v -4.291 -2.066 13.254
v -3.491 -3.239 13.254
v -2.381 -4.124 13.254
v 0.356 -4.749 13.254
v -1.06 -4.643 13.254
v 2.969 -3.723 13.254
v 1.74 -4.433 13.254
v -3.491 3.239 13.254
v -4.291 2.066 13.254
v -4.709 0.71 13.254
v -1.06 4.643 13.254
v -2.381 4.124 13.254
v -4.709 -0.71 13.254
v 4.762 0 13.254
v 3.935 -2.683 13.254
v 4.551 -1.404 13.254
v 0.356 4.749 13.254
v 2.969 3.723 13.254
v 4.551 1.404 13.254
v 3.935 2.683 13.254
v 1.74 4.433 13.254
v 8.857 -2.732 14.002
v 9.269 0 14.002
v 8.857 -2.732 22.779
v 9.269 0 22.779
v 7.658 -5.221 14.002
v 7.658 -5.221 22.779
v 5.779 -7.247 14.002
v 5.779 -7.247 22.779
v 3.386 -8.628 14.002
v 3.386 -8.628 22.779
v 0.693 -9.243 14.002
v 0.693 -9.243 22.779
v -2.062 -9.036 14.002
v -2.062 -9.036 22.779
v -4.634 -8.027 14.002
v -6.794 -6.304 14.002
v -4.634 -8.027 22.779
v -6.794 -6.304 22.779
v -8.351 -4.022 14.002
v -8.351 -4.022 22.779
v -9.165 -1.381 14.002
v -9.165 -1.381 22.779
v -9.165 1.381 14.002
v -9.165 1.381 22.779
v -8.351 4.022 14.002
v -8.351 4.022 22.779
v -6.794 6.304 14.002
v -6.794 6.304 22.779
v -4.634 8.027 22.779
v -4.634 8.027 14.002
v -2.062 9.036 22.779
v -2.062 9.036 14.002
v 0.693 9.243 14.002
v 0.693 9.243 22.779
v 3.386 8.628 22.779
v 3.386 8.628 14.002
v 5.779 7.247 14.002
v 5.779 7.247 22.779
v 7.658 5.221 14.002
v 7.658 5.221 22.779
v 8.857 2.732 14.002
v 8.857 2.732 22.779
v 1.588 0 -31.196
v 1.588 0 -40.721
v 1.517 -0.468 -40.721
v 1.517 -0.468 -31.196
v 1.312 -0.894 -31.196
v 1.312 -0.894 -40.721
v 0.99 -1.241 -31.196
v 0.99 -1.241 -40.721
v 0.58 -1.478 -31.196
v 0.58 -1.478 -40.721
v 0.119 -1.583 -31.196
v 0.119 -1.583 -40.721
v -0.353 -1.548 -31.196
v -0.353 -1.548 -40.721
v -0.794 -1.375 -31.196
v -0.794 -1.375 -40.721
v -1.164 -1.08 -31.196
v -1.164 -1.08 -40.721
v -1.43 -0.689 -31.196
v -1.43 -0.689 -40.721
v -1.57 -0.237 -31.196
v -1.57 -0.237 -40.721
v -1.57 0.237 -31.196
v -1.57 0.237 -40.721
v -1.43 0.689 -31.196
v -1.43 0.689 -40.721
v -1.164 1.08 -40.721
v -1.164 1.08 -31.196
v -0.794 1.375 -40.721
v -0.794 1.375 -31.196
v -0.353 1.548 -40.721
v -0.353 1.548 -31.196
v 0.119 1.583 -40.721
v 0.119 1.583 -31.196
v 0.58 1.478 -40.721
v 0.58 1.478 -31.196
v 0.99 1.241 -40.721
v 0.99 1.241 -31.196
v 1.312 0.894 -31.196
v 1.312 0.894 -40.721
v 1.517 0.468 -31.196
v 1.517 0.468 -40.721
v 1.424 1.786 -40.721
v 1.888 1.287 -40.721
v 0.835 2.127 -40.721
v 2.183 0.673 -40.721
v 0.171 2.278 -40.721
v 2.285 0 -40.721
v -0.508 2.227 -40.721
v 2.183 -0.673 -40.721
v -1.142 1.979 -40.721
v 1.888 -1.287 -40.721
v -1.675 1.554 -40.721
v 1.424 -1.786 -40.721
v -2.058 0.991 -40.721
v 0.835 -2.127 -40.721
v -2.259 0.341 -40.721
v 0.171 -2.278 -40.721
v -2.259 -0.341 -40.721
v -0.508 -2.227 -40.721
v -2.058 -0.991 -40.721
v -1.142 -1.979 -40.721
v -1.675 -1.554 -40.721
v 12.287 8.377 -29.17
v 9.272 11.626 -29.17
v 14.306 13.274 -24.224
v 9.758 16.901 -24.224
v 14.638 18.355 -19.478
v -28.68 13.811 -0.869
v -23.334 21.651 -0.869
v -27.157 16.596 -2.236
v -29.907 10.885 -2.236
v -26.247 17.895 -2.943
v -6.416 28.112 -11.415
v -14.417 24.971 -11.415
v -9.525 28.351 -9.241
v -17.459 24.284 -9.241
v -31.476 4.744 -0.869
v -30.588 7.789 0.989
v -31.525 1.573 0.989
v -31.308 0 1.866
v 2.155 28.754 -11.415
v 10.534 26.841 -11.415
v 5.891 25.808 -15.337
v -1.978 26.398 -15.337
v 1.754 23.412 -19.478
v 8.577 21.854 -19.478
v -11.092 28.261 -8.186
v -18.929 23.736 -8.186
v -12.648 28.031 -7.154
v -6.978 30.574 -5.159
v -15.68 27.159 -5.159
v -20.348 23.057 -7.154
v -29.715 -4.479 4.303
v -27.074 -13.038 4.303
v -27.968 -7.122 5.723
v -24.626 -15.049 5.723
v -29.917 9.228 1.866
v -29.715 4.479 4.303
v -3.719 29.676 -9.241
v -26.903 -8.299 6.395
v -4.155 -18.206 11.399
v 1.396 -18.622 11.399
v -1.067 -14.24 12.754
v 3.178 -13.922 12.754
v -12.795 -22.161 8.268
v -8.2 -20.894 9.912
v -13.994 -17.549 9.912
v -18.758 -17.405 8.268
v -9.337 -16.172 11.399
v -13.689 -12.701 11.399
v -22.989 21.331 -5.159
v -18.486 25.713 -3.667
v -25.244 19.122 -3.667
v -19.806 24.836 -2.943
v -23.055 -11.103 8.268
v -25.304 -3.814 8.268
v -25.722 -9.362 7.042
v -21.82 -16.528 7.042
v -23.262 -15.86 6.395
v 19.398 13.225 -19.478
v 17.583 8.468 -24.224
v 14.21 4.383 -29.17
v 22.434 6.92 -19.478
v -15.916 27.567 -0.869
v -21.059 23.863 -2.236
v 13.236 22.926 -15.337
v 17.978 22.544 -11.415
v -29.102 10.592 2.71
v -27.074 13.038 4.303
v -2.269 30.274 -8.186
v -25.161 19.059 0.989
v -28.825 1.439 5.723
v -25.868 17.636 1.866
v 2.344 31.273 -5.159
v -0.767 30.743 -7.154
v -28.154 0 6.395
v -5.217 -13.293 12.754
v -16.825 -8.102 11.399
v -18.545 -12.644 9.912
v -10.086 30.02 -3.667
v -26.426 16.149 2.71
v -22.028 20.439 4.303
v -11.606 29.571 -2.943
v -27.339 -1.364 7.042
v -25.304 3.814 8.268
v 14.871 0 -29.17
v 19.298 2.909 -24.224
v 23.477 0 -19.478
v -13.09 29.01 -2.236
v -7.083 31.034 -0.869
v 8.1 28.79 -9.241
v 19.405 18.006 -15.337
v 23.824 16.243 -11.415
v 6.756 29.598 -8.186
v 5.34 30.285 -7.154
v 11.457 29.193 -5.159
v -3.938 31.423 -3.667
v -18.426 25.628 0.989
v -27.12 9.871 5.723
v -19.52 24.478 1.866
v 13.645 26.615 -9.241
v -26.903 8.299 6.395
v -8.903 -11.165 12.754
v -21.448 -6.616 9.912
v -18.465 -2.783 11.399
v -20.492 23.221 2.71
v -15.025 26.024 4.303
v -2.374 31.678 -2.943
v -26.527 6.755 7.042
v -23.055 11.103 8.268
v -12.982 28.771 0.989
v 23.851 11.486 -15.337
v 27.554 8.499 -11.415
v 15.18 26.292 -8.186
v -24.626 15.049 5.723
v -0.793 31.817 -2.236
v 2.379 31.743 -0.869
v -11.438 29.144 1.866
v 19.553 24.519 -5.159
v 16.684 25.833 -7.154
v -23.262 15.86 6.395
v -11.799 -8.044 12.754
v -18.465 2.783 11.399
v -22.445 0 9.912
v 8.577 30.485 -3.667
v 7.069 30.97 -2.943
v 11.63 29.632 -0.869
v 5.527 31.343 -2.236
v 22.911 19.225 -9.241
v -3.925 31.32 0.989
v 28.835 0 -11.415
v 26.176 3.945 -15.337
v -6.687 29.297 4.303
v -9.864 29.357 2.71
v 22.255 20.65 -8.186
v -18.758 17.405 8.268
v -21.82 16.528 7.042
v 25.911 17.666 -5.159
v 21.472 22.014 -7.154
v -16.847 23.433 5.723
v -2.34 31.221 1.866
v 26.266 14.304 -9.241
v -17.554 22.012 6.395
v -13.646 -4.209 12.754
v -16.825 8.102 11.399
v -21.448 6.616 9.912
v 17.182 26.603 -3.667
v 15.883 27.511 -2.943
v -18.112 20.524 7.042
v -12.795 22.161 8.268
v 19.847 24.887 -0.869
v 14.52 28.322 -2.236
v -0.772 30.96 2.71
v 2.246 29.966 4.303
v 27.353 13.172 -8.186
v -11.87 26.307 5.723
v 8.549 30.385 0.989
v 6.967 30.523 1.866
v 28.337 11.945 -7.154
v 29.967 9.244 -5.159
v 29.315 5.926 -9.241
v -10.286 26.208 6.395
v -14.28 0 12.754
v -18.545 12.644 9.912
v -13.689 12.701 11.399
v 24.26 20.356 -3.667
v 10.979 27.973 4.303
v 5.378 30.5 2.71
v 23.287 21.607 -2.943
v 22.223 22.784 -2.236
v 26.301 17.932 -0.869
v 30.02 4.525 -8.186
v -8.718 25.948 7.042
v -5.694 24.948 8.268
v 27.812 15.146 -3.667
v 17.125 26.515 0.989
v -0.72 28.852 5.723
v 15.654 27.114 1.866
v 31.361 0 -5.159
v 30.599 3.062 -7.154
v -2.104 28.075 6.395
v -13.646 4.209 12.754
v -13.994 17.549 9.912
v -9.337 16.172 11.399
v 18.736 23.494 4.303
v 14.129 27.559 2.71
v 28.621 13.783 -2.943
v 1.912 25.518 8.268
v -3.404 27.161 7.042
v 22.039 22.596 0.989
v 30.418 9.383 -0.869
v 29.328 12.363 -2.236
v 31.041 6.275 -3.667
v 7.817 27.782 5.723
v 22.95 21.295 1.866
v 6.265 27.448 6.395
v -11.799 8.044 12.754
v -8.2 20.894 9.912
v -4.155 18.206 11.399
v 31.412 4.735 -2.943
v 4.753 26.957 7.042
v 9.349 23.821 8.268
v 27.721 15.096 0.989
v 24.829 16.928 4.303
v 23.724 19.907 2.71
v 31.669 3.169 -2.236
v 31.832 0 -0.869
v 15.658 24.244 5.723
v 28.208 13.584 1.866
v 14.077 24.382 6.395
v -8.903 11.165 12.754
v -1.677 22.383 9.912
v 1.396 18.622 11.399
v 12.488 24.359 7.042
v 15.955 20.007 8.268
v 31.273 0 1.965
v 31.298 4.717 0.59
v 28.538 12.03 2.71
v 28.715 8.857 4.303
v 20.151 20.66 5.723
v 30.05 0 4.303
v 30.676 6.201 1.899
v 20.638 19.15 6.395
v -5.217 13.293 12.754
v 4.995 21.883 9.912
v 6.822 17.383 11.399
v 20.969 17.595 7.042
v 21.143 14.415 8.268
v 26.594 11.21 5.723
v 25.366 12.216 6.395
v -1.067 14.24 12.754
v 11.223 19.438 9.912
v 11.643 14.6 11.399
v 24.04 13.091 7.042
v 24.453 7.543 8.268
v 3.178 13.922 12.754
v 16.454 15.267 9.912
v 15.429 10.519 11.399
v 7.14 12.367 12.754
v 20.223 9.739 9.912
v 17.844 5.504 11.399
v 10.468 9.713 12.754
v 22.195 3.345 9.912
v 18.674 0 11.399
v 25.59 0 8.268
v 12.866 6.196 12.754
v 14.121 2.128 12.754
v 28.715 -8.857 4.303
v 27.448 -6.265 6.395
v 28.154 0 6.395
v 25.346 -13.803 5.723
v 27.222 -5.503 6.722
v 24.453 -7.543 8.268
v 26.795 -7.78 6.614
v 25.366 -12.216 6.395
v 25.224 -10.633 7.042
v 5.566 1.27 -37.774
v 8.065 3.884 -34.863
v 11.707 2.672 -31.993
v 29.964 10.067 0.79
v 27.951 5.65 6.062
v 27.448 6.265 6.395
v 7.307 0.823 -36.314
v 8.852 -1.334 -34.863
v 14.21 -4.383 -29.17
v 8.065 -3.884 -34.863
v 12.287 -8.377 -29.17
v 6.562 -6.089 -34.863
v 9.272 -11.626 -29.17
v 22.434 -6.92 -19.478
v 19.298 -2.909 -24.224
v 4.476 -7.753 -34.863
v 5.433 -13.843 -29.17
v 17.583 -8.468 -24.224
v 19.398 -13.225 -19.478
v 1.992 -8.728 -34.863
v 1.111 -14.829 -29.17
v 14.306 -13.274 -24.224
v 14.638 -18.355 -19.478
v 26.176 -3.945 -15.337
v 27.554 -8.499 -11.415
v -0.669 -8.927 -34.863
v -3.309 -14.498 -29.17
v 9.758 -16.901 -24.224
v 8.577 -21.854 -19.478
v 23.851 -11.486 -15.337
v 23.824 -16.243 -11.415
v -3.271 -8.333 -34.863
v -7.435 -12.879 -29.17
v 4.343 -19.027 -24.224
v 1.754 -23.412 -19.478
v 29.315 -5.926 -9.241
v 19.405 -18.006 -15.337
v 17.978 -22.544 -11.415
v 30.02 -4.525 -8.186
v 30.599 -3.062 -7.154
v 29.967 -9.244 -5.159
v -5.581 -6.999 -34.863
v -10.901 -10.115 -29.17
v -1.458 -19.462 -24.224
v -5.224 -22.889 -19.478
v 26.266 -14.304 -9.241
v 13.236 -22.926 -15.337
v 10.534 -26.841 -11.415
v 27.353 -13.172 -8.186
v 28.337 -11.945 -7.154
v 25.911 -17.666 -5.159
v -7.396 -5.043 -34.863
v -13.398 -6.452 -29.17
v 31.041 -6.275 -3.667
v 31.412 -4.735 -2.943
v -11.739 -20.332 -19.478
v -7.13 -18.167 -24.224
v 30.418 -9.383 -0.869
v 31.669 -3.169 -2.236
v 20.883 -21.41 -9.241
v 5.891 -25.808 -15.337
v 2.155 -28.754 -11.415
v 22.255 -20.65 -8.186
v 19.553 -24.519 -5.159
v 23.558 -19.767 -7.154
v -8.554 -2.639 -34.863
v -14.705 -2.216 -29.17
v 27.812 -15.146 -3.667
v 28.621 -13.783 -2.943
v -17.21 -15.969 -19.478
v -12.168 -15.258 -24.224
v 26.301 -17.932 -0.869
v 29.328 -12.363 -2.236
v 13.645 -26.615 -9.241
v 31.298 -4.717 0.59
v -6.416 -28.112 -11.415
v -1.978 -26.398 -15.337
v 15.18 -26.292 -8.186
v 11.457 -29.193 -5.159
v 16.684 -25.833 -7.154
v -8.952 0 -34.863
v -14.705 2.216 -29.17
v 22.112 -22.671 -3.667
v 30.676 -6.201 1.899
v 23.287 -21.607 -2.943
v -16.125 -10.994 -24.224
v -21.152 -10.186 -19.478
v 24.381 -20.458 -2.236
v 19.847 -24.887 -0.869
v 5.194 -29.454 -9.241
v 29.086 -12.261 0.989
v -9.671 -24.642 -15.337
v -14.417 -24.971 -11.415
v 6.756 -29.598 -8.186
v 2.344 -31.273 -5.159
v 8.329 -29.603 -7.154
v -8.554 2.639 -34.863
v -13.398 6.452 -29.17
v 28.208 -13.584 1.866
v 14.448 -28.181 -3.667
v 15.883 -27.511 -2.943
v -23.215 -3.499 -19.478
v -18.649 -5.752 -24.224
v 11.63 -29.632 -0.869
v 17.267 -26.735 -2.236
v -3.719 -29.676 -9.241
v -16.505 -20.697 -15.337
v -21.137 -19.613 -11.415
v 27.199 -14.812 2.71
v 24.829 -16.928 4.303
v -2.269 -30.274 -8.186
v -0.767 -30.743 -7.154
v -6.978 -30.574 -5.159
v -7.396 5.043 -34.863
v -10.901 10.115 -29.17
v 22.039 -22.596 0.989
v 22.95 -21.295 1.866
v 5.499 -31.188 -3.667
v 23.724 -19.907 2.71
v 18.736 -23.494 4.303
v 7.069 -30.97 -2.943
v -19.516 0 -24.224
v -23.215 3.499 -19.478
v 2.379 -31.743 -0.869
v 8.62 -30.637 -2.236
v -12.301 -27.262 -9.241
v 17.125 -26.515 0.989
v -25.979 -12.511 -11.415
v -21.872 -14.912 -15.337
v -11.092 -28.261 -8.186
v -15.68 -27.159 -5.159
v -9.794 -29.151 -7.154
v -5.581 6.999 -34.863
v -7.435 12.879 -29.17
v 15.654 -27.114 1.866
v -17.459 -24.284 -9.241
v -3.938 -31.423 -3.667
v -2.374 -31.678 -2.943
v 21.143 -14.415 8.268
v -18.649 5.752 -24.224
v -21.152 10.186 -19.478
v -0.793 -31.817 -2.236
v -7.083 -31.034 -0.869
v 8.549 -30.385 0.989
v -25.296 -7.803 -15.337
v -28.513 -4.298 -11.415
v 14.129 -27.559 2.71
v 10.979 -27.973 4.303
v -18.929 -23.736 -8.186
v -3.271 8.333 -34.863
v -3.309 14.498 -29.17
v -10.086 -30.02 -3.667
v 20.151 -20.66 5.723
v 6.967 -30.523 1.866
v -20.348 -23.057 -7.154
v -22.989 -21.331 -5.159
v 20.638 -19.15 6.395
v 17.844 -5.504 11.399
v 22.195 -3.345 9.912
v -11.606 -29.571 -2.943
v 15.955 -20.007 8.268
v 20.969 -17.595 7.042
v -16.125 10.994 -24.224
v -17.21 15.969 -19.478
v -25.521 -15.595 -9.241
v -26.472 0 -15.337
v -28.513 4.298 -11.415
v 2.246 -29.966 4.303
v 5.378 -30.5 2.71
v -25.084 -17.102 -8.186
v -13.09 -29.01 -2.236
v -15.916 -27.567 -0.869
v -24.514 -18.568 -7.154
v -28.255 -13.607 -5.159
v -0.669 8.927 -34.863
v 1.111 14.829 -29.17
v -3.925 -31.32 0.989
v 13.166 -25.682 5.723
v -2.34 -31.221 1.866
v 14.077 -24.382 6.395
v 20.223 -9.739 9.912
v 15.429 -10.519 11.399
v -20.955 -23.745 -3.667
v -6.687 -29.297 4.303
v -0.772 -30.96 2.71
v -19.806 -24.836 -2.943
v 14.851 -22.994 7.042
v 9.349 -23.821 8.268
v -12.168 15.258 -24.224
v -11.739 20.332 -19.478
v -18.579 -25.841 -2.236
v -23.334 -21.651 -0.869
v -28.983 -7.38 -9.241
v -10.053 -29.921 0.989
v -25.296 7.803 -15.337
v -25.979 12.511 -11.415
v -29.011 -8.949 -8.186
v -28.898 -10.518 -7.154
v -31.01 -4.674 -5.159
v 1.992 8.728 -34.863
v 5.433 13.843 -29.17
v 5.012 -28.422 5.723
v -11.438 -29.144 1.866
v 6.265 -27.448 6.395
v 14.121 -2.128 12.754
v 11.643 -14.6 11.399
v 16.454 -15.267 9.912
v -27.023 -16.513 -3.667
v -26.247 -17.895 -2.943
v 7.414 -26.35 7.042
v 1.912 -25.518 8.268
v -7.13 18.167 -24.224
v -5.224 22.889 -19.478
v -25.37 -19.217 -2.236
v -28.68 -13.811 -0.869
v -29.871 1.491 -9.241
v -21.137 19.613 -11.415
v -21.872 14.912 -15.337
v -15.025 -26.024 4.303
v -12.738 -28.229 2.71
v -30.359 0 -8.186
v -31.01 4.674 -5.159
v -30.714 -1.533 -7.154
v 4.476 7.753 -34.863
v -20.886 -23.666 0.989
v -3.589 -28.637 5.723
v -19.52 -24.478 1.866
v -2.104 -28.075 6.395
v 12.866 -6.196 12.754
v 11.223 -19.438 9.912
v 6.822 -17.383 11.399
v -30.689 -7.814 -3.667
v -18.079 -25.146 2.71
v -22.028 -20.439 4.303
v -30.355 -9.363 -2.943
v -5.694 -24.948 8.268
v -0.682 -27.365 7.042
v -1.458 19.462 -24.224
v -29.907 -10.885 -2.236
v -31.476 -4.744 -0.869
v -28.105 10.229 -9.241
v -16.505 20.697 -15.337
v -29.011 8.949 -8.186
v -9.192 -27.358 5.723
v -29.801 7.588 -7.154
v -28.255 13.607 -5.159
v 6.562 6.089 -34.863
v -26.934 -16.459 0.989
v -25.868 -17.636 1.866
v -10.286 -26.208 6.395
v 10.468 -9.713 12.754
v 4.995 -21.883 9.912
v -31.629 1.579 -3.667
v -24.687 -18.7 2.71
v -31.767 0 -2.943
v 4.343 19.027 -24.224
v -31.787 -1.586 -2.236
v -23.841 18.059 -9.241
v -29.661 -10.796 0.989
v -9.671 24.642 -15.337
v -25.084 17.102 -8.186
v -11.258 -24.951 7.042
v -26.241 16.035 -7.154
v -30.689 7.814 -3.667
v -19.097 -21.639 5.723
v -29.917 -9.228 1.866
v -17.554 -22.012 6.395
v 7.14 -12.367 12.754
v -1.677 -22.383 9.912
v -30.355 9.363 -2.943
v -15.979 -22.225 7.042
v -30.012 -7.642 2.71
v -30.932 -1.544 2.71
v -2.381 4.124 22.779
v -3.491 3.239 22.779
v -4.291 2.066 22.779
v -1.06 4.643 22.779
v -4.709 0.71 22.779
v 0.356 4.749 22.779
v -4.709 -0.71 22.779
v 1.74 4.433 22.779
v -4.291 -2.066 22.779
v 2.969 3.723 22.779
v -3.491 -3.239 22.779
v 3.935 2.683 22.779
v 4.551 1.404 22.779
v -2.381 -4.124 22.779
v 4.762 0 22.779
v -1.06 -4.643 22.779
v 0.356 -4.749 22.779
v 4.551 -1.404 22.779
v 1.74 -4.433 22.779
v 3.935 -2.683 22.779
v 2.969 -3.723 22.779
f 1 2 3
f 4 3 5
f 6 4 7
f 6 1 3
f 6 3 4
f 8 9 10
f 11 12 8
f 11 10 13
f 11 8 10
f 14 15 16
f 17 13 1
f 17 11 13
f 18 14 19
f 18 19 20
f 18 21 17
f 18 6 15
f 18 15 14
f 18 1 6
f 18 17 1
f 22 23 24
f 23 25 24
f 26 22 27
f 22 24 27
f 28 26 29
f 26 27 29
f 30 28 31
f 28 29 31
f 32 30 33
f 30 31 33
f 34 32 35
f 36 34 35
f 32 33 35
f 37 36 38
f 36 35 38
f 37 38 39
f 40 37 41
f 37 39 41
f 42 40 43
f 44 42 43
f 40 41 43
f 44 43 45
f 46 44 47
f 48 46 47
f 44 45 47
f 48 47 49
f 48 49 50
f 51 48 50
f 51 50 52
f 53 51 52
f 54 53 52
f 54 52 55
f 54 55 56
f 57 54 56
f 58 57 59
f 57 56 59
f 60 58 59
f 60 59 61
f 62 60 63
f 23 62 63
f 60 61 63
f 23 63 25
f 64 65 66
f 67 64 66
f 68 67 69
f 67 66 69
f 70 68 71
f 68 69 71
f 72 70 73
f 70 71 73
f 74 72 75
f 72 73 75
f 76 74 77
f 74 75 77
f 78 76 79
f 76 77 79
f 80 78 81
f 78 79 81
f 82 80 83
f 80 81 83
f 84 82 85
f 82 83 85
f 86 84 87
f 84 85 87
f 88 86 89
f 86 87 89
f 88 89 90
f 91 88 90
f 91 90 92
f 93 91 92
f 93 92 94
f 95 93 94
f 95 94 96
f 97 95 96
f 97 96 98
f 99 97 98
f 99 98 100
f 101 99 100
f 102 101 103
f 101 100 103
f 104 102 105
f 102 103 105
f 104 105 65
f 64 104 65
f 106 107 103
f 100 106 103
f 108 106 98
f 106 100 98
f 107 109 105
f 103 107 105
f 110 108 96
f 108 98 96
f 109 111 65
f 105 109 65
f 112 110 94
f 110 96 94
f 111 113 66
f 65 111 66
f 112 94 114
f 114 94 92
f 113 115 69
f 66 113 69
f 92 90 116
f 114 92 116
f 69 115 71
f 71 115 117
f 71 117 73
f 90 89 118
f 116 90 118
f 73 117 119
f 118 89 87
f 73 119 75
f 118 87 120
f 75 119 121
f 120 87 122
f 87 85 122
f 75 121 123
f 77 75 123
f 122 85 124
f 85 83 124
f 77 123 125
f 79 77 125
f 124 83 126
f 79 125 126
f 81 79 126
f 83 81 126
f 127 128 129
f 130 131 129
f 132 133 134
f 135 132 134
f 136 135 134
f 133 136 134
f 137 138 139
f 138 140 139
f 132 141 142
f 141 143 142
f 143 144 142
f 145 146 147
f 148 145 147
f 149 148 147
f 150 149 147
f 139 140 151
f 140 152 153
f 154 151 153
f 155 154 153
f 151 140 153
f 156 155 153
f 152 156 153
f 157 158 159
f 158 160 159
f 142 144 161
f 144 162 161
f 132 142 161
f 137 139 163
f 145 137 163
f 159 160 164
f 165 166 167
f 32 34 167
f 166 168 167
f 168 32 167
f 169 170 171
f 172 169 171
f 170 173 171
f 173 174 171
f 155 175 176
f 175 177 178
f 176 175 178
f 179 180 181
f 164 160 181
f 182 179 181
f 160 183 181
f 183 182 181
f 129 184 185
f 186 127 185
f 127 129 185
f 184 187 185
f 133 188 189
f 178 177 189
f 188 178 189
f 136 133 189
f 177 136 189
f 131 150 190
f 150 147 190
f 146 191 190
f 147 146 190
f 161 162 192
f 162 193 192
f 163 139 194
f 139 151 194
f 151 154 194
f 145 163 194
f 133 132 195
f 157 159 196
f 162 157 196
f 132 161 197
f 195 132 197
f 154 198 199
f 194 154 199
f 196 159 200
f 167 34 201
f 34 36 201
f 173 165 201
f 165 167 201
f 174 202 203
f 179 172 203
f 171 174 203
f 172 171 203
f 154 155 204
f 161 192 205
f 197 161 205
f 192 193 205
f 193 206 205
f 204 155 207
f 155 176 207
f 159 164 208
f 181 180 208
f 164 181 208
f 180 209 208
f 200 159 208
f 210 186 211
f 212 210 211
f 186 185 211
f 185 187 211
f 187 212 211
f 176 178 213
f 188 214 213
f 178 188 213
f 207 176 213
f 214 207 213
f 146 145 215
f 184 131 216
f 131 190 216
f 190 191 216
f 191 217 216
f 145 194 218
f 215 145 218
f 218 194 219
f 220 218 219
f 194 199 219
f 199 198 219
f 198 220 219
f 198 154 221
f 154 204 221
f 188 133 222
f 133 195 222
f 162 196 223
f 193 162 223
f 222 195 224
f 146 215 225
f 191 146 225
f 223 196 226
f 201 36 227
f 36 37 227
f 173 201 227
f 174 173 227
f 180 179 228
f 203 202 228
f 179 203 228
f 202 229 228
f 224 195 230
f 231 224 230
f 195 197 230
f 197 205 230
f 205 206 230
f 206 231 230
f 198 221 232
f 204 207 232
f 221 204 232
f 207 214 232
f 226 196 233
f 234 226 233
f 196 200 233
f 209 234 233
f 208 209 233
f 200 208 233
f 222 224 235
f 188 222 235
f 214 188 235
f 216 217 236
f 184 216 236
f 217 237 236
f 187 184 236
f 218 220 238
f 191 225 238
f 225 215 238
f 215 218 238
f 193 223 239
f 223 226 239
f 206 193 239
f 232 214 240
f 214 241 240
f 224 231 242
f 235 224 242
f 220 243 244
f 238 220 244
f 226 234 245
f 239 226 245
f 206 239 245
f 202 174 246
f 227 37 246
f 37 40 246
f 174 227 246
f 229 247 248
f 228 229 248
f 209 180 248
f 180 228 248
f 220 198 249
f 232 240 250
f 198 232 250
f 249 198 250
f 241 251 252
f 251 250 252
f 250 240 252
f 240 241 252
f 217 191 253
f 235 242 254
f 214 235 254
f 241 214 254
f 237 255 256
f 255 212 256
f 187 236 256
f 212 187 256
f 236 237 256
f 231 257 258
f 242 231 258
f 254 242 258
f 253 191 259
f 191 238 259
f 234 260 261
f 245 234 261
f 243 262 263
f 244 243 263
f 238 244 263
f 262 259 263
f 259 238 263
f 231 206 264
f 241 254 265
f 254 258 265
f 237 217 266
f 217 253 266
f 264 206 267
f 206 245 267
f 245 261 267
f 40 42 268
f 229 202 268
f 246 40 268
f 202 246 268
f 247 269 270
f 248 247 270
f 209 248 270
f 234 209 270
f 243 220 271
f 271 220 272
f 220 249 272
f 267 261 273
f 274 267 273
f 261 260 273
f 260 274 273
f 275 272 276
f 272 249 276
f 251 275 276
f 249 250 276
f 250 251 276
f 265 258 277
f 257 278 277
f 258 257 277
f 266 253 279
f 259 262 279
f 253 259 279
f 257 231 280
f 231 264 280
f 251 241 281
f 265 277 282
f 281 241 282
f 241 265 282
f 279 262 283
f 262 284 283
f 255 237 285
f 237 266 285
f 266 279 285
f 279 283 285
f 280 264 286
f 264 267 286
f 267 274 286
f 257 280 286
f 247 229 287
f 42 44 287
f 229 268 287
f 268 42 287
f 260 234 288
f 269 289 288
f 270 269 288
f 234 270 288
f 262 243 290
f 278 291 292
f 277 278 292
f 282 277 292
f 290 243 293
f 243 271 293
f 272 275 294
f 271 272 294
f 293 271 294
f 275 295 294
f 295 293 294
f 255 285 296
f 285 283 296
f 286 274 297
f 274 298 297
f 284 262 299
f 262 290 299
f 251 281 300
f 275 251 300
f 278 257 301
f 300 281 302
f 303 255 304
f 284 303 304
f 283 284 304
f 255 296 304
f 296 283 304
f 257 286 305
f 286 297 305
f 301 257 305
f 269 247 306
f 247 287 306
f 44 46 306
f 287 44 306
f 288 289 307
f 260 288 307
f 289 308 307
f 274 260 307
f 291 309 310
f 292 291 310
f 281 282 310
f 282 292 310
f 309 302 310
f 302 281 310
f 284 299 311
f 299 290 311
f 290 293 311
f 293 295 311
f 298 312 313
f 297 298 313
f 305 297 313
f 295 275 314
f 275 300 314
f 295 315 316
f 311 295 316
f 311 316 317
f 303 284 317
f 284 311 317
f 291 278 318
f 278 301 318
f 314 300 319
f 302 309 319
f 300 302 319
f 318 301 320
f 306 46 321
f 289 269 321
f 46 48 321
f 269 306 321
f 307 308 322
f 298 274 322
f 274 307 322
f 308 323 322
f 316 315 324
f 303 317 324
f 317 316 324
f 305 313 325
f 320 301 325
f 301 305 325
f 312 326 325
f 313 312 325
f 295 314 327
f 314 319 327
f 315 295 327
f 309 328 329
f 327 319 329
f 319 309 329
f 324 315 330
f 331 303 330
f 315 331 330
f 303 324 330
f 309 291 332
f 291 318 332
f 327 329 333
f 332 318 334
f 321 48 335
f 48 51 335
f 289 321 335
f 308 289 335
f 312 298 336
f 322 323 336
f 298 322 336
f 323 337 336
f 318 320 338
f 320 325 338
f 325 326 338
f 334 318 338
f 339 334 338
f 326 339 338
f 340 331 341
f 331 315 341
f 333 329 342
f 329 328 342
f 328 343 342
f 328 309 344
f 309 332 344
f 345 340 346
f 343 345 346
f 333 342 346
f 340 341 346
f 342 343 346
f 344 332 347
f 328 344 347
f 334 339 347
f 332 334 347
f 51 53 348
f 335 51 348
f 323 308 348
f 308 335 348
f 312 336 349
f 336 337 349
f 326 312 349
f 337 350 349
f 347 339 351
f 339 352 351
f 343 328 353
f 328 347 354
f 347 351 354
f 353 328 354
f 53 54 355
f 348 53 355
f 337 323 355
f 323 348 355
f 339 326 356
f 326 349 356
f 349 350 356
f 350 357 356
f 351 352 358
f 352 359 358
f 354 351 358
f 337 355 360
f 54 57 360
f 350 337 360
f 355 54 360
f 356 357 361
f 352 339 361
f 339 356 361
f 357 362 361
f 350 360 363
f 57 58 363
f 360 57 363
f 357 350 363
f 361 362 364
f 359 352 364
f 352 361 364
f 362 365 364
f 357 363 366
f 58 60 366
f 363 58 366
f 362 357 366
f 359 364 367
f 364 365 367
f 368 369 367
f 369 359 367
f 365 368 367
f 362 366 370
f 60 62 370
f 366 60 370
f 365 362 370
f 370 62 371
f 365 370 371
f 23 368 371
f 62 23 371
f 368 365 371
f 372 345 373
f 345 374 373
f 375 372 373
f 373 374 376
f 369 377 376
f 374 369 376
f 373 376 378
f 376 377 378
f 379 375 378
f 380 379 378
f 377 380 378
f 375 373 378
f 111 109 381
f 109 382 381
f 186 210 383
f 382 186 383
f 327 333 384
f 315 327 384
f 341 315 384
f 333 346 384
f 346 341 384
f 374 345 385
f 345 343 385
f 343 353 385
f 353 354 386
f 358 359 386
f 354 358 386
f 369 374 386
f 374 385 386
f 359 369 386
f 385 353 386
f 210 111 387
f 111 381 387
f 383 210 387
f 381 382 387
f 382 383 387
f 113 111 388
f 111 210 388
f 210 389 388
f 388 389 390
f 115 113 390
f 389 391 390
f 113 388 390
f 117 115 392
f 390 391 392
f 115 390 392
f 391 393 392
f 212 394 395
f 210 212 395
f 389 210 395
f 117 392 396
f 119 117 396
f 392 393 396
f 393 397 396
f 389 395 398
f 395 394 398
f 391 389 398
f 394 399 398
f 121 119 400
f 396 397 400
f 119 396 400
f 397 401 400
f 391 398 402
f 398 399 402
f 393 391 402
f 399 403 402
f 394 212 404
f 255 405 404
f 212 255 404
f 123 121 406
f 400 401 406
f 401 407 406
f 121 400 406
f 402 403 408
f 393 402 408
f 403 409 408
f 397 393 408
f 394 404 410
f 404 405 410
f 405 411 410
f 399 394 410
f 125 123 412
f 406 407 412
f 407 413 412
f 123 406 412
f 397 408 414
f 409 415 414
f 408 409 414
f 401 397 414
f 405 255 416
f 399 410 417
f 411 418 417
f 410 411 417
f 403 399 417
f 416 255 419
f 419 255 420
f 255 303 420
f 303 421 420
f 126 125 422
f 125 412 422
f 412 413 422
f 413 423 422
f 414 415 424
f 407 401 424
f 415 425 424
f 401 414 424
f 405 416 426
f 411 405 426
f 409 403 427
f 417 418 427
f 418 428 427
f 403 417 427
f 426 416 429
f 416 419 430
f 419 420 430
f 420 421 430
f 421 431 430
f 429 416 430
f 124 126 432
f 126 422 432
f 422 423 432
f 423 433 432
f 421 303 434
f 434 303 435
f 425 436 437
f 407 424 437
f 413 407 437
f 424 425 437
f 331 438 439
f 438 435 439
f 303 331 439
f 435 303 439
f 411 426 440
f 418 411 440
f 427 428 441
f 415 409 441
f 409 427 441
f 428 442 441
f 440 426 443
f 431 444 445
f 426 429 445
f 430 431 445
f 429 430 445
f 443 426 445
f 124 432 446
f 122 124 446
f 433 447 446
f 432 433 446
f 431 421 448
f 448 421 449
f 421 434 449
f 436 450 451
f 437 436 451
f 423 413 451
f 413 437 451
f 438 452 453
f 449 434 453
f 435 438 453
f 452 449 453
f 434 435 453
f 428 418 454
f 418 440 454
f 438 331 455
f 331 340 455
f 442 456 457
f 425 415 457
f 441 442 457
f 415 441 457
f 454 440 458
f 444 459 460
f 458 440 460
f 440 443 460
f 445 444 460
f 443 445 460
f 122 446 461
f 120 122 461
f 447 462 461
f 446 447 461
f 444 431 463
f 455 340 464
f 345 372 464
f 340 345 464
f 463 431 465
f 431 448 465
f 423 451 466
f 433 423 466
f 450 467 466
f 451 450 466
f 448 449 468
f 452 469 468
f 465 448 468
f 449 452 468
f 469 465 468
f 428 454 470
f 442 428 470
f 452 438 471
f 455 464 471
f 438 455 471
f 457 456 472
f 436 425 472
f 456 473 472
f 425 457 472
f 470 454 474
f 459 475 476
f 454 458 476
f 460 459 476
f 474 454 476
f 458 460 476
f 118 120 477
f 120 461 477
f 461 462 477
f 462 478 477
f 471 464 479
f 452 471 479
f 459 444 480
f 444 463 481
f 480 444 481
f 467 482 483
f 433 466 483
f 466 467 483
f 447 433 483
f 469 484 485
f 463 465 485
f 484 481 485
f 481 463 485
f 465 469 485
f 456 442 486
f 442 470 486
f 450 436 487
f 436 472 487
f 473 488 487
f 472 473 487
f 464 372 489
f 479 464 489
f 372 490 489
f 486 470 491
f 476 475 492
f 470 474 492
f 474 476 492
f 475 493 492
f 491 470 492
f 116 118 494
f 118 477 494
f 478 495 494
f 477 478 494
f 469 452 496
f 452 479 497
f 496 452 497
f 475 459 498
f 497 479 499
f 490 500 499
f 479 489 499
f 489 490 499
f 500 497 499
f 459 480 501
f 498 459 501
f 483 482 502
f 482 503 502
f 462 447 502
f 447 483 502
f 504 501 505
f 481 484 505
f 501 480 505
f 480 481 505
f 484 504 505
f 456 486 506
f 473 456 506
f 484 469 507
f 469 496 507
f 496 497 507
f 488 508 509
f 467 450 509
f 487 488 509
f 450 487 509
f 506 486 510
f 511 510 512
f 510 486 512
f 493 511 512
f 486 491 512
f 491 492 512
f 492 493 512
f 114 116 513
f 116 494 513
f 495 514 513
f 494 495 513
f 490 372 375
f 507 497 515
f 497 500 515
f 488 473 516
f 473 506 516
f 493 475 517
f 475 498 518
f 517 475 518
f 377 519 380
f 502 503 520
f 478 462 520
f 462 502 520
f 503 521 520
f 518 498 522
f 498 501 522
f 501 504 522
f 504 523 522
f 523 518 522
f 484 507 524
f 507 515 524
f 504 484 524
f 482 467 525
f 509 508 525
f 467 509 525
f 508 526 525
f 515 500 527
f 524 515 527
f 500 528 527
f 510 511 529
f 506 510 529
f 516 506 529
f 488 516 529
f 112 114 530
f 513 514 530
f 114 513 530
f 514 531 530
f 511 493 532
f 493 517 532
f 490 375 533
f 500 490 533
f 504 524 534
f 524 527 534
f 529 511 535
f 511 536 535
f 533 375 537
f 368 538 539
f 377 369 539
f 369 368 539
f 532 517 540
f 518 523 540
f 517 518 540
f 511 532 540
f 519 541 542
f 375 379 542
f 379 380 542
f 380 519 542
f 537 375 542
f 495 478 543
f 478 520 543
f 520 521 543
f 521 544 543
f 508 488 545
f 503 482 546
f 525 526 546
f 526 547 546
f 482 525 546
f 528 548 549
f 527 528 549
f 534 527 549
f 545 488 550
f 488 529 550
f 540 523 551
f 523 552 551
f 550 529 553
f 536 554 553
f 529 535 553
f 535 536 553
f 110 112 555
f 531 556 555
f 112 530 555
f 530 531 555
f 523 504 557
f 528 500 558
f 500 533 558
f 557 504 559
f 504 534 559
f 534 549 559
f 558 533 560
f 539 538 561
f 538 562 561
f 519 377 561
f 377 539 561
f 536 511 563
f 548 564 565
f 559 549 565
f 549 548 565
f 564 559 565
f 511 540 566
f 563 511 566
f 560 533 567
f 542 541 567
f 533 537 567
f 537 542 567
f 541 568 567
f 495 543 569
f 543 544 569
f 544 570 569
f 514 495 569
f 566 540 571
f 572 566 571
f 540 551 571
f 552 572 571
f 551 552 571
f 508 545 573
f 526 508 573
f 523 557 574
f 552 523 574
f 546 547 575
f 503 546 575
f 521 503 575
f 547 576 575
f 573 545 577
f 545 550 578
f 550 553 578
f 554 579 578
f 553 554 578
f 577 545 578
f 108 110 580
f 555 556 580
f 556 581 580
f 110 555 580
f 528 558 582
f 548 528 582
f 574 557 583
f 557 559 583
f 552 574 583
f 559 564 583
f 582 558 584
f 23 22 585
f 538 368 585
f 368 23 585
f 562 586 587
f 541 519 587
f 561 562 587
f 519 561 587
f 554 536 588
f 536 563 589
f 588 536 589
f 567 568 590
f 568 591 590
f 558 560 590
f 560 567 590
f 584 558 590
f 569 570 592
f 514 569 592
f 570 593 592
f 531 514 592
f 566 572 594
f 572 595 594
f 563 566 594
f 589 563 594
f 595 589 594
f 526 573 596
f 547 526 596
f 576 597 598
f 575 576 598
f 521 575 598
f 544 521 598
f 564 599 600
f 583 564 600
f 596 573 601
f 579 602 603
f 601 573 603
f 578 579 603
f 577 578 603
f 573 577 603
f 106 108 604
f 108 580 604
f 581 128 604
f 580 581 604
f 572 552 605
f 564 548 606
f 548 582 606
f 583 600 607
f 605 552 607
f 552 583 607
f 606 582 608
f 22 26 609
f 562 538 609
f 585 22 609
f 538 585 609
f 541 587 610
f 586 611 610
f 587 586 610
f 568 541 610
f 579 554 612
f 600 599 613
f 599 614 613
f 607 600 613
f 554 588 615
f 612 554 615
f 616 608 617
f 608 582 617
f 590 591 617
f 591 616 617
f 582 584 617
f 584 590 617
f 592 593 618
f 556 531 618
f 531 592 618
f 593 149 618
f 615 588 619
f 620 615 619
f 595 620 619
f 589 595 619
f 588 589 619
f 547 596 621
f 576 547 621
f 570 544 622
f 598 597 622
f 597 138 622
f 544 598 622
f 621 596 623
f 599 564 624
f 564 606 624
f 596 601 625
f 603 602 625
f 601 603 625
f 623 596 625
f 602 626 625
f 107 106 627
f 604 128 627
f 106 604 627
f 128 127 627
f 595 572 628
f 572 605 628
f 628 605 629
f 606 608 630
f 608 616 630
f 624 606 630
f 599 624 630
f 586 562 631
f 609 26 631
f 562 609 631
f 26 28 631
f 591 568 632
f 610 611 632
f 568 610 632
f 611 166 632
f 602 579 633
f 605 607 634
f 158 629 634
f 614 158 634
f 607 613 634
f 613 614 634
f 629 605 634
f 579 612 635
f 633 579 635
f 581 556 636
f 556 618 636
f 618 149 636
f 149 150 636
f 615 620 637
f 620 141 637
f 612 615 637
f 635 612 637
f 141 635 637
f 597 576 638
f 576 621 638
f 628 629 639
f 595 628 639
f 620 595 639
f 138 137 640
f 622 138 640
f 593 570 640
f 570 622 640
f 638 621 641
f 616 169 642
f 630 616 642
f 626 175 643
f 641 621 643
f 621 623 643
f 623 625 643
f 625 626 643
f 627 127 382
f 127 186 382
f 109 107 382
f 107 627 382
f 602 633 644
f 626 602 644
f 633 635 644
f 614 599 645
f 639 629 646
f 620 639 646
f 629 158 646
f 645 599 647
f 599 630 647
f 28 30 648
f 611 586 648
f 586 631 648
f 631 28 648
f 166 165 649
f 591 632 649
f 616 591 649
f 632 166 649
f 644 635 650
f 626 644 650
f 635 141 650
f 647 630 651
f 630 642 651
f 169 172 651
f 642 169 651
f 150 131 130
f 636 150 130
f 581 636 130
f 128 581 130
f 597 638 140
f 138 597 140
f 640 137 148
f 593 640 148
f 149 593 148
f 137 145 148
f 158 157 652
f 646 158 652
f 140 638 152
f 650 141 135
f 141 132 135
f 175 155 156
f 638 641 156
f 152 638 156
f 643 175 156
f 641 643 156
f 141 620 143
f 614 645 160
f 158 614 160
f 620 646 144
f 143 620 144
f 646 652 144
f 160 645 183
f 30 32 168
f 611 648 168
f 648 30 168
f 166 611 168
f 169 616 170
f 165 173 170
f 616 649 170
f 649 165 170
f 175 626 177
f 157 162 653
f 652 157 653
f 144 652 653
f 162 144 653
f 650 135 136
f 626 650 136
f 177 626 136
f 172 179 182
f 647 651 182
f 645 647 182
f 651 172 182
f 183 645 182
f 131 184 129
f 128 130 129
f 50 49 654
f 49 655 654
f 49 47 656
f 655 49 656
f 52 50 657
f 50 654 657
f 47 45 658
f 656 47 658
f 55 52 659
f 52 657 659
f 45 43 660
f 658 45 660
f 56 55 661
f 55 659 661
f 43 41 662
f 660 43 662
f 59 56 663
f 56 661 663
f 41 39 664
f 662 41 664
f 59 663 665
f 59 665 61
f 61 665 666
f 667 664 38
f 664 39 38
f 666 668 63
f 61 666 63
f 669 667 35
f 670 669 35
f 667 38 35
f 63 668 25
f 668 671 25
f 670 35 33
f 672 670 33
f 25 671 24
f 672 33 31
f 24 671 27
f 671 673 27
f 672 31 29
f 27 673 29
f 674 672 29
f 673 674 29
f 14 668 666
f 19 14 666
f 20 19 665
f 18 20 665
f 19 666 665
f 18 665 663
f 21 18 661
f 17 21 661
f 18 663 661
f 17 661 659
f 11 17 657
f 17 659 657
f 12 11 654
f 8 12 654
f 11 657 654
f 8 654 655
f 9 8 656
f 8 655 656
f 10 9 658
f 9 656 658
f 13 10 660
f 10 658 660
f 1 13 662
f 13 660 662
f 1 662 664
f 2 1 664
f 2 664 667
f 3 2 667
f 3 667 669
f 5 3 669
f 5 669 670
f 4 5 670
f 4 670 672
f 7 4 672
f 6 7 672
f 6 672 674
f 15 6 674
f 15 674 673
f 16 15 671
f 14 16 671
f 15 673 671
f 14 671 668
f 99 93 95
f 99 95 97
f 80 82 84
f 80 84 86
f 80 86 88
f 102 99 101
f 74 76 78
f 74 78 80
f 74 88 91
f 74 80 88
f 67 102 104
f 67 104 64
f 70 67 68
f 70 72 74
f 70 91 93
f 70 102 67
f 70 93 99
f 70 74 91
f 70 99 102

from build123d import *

# Parameters (mm, degrees)
F2_R     = 1.5875
F3_DEPTH = 9.525
F4_R     = 4.7625
F5_DEPTH = 9.525


with BuildPart() as f1:
    # F0 (on Front) → F1 (revolve)
    with BuildSketch(Plane.XZ):
        with BuildLine():
            add(Edge.make_bspline(
                [(2.2846506909, -40.7209396362), (21.63124053, -24.4006685783), (41.3189275658, 1.3811586384), (23.189734926, 10.8521669118), (9.2686334939, 14.001551751)],
                knots=[0, 0, 0, 0, 0.579409192, 1, 1, 1, 1], degree=3))
            Line((9.2686334939, 14.001551751), (9.2686334939, 22.7790603638))
            Line((9.2686334939, 22.7790603638), (0, 22.7790603638))
            Line((0, 22.7790603638), (0, -40.7209396362))
            Line((0, -40.7209396362), (2.2846506909, -40.7209396362))
        make_face()
    revolve(axis=Axis((0, 0, -8.9709396362), (0, 0, -1)))

    # F2 (on face) → F3 (cut)
    with BuildSketch(Plane(origin=(0, 0, -40.7209396362), x_dir=(1, 0, 0), z_dir=(0, 0, -1))):
        Circle(F2_R)
    extrude(amount=-F3_DEPTH, mode=Mode.SUBTRACT)

    # F4 (on face) → F5 (cut)
    with BuildSketch(Plane.XY.offset(22.7790603638)):
        Circle(F4_R)
    extrude(amount=-F5_DEPTH, mode=Mode.SUBTRACT)


solid = f1.part
